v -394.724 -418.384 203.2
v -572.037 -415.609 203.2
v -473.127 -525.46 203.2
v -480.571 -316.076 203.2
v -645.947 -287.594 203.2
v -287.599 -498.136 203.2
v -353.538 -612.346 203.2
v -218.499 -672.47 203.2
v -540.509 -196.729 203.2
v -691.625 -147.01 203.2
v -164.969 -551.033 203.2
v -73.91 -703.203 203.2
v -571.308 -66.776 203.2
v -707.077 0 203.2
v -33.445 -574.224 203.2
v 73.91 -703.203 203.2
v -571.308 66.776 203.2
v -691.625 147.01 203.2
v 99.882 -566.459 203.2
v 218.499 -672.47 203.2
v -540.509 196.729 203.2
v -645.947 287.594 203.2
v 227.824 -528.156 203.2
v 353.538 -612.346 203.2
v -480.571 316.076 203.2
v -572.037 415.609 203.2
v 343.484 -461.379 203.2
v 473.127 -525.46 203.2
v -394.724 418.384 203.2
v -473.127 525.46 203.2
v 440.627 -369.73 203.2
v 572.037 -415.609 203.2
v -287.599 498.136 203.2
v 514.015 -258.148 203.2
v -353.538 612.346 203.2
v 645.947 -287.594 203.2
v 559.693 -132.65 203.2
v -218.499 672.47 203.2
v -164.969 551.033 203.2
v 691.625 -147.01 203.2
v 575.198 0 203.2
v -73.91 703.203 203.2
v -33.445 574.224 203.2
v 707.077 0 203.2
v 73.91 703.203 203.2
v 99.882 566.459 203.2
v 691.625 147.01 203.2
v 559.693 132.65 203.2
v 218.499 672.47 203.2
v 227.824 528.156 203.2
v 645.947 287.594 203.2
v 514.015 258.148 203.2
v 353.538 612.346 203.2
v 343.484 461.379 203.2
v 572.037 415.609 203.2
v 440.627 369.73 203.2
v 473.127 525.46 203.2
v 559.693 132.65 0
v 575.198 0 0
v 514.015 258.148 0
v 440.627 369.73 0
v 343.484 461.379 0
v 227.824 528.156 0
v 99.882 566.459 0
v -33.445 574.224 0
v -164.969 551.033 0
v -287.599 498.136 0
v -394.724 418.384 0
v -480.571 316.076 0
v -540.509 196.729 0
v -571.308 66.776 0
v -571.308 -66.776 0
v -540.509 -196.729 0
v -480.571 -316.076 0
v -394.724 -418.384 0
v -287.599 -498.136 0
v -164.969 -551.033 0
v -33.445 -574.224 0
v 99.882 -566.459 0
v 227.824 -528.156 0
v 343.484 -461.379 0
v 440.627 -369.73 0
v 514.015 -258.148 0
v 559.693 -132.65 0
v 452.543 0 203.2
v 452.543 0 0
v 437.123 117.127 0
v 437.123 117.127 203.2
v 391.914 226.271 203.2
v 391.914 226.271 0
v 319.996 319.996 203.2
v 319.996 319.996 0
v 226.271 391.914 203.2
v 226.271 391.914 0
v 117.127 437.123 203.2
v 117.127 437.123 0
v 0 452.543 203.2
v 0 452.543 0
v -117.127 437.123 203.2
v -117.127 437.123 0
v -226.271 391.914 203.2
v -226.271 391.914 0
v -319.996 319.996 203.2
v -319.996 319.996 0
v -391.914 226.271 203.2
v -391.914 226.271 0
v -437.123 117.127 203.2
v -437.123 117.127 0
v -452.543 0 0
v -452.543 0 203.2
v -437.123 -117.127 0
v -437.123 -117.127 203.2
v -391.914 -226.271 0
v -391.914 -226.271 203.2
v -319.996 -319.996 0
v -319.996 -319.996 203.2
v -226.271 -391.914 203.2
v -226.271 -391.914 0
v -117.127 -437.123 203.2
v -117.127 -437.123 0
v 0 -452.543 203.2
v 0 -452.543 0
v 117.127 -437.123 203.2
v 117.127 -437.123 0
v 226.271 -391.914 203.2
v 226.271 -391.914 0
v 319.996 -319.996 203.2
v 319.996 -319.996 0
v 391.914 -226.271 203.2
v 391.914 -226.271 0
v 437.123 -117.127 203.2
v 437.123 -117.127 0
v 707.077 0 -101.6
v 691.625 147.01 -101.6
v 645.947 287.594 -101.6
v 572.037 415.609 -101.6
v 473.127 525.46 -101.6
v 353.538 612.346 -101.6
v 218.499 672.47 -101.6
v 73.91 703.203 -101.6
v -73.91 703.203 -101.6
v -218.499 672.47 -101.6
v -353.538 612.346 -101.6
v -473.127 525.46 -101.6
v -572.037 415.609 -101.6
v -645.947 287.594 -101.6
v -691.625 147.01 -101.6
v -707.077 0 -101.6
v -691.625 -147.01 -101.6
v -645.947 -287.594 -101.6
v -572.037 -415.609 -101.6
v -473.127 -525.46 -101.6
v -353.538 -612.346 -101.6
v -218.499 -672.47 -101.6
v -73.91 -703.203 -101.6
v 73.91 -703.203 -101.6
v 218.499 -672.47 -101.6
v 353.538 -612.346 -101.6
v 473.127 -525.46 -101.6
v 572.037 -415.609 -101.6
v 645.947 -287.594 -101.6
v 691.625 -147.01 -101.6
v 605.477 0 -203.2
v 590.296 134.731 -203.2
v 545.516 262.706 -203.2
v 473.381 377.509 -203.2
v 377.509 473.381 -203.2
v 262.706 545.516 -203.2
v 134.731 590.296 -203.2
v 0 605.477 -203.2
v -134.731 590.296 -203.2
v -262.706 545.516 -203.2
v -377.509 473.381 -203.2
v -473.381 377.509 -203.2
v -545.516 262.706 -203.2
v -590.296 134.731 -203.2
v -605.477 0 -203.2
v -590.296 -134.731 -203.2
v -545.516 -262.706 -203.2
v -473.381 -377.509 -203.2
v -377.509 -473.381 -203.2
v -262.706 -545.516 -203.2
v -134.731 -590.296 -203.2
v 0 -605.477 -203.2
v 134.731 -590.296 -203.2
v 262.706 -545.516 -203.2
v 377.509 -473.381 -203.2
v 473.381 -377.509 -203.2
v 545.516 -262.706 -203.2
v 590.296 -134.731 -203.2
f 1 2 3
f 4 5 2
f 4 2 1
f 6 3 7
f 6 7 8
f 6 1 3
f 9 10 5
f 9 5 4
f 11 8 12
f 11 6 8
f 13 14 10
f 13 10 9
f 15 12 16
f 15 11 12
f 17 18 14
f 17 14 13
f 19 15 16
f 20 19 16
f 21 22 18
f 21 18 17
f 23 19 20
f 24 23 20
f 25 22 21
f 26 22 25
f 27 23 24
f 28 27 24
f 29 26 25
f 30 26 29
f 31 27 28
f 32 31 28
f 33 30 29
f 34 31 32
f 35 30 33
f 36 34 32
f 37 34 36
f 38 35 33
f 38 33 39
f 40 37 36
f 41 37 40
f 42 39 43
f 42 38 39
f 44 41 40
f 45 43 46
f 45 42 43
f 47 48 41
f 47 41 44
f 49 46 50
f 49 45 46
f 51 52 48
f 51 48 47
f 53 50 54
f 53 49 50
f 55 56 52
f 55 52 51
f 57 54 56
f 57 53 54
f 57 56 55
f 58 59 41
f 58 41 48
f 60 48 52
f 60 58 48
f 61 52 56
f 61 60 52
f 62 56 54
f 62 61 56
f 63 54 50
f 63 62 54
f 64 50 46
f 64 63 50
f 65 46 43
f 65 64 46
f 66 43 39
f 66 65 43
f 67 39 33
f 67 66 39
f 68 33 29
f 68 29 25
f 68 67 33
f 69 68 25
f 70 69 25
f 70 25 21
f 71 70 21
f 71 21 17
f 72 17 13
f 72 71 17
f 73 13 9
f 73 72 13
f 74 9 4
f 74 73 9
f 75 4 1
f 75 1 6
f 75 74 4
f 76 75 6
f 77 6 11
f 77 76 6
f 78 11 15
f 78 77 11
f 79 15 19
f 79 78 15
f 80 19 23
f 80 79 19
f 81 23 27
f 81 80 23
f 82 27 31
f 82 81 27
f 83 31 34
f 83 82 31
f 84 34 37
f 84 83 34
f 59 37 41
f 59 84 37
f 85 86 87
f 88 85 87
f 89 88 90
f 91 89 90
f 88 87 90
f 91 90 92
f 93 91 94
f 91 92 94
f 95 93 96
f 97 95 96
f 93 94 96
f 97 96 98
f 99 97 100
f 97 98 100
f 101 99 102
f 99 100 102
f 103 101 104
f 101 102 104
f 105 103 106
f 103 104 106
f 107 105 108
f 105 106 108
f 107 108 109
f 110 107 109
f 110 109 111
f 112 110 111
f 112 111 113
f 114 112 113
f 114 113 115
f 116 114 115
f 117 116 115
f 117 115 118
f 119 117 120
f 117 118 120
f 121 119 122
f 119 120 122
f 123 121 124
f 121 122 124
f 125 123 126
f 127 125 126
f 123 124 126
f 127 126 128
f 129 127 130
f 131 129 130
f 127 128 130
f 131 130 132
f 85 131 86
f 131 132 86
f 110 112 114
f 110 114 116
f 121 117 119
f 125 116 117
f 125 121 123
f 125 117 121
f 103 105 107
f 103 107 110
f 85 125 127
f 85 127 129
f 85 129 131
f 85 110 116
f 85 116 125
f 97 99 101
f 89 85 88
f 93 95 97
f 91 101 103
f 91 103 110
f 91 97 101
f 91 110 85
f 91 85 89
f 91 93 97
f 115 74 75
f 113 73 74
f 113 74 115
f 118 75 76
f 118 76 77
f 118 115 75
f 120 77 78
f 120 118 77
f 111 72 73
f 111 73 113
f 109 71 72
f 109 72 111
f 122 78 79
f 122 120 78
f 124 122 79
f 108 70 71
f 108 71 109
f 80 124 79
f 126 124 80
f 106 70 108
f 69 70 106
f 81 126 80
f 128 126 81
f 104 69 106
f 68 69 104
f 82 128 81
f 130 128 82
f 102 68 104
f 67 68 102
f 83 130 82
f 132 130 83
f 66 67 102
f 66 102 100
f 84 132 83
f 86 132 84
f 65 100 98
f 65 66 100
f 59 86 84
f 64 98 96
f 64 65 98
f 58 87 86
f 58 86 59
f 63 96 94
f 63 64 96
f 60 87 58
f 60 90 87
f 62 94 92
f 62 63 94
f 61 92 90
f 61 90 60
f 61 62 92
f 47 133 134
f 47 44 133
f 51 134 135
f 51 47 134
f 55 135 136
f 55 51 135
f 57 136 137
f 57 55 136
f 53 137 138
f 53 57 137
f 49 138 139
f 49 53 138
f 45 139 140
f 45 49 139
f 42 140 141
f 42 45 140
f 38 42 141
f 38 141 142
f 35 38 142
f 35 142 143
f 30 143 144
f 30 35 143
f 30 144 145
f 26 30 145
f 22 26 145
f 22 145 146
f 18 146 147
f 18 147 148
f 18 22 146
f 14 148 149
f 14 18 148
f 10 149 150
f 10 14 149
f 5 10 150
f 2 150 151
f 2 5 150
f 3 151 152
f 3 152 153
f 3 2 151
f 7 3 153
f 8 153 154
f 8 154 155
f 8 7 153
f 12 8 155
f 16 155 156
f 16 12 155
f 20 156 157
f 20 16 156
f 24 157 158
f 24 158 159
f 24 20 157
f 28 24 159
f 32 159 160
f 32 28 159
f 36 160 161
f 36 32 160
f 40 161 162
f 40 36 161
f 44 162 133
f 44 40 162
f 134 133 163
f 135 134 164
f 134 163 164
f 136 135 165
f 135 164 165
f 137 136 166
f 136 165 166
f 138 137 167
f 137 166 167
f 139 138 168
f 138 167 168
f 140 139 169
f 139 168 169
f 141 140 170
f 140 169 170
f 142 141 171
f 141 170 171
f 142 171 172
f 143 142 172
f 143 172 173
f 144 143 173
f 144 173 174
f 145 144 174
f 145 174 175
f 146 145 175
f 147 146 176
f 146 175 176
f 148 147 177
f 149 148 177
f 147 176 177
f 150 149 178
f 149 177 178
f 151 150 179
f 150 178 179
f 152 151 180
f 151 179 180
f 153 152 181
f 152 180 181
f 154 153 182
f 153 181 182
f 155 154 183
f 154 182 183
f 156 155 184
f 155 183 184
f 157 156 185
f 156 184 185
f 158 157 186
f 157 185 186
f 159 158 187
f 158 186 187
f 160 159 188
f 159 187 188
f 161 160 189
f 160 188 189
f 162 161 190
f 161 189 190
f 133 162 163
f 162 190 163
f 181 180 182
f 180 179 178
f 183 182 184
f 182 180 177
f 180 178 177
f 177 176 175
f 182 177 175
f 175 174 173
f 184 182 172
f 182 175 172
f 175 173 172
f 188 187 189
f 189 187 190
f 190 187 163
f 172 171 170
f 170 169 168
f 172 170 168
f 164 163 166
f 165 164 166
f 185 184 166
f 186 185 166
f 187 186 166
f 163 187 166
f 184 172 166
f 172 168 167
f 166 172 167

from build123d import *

# Parameters (mm, degrees)
F0_R     = 707.076711983
F0_R_2   = 575.1975047279
F0_R_3   = 452.5428910843
F1_DEPTH = 203.2
F2_DEPTH = 203.2
F3_SIZE  = 101.6


# Not quite as in the source:
# - a feature names something its author has since deleted; it is built from what else it names


with BuildPart() as f1:
    # F0 (on Top) → F1 (new body)
    with BuildSketch(Plane.XY):
        Circle(F0_R)
        Circle(F0_R_2, mode=Mode.SUBTRACT)
        Circle(F0_R_2)
        Circle(F0_R_3, mode=Mode.SUBTRACT)
        Circle(F0_R_3)
    extrude(amount=-F1_DEPTH)

    # F0 (on Top) → F2 (join)
    with BuildSketch(Plane.XY):
        Circle(F0_R)
        Circle(F0_R_2, mode=Mode.SUBTRACT)
        Circle(F0_R_3)
    extrude(amount=F2_DEPTH)

    # F3
    f3_edges = [f1.edges().sort_by_distance(p)[0] for p in [
        (-707.076712, 0, -203.2),
    ]]
    chamfer(f3_edges, length=F3_SIZE)


solid = f1.part
